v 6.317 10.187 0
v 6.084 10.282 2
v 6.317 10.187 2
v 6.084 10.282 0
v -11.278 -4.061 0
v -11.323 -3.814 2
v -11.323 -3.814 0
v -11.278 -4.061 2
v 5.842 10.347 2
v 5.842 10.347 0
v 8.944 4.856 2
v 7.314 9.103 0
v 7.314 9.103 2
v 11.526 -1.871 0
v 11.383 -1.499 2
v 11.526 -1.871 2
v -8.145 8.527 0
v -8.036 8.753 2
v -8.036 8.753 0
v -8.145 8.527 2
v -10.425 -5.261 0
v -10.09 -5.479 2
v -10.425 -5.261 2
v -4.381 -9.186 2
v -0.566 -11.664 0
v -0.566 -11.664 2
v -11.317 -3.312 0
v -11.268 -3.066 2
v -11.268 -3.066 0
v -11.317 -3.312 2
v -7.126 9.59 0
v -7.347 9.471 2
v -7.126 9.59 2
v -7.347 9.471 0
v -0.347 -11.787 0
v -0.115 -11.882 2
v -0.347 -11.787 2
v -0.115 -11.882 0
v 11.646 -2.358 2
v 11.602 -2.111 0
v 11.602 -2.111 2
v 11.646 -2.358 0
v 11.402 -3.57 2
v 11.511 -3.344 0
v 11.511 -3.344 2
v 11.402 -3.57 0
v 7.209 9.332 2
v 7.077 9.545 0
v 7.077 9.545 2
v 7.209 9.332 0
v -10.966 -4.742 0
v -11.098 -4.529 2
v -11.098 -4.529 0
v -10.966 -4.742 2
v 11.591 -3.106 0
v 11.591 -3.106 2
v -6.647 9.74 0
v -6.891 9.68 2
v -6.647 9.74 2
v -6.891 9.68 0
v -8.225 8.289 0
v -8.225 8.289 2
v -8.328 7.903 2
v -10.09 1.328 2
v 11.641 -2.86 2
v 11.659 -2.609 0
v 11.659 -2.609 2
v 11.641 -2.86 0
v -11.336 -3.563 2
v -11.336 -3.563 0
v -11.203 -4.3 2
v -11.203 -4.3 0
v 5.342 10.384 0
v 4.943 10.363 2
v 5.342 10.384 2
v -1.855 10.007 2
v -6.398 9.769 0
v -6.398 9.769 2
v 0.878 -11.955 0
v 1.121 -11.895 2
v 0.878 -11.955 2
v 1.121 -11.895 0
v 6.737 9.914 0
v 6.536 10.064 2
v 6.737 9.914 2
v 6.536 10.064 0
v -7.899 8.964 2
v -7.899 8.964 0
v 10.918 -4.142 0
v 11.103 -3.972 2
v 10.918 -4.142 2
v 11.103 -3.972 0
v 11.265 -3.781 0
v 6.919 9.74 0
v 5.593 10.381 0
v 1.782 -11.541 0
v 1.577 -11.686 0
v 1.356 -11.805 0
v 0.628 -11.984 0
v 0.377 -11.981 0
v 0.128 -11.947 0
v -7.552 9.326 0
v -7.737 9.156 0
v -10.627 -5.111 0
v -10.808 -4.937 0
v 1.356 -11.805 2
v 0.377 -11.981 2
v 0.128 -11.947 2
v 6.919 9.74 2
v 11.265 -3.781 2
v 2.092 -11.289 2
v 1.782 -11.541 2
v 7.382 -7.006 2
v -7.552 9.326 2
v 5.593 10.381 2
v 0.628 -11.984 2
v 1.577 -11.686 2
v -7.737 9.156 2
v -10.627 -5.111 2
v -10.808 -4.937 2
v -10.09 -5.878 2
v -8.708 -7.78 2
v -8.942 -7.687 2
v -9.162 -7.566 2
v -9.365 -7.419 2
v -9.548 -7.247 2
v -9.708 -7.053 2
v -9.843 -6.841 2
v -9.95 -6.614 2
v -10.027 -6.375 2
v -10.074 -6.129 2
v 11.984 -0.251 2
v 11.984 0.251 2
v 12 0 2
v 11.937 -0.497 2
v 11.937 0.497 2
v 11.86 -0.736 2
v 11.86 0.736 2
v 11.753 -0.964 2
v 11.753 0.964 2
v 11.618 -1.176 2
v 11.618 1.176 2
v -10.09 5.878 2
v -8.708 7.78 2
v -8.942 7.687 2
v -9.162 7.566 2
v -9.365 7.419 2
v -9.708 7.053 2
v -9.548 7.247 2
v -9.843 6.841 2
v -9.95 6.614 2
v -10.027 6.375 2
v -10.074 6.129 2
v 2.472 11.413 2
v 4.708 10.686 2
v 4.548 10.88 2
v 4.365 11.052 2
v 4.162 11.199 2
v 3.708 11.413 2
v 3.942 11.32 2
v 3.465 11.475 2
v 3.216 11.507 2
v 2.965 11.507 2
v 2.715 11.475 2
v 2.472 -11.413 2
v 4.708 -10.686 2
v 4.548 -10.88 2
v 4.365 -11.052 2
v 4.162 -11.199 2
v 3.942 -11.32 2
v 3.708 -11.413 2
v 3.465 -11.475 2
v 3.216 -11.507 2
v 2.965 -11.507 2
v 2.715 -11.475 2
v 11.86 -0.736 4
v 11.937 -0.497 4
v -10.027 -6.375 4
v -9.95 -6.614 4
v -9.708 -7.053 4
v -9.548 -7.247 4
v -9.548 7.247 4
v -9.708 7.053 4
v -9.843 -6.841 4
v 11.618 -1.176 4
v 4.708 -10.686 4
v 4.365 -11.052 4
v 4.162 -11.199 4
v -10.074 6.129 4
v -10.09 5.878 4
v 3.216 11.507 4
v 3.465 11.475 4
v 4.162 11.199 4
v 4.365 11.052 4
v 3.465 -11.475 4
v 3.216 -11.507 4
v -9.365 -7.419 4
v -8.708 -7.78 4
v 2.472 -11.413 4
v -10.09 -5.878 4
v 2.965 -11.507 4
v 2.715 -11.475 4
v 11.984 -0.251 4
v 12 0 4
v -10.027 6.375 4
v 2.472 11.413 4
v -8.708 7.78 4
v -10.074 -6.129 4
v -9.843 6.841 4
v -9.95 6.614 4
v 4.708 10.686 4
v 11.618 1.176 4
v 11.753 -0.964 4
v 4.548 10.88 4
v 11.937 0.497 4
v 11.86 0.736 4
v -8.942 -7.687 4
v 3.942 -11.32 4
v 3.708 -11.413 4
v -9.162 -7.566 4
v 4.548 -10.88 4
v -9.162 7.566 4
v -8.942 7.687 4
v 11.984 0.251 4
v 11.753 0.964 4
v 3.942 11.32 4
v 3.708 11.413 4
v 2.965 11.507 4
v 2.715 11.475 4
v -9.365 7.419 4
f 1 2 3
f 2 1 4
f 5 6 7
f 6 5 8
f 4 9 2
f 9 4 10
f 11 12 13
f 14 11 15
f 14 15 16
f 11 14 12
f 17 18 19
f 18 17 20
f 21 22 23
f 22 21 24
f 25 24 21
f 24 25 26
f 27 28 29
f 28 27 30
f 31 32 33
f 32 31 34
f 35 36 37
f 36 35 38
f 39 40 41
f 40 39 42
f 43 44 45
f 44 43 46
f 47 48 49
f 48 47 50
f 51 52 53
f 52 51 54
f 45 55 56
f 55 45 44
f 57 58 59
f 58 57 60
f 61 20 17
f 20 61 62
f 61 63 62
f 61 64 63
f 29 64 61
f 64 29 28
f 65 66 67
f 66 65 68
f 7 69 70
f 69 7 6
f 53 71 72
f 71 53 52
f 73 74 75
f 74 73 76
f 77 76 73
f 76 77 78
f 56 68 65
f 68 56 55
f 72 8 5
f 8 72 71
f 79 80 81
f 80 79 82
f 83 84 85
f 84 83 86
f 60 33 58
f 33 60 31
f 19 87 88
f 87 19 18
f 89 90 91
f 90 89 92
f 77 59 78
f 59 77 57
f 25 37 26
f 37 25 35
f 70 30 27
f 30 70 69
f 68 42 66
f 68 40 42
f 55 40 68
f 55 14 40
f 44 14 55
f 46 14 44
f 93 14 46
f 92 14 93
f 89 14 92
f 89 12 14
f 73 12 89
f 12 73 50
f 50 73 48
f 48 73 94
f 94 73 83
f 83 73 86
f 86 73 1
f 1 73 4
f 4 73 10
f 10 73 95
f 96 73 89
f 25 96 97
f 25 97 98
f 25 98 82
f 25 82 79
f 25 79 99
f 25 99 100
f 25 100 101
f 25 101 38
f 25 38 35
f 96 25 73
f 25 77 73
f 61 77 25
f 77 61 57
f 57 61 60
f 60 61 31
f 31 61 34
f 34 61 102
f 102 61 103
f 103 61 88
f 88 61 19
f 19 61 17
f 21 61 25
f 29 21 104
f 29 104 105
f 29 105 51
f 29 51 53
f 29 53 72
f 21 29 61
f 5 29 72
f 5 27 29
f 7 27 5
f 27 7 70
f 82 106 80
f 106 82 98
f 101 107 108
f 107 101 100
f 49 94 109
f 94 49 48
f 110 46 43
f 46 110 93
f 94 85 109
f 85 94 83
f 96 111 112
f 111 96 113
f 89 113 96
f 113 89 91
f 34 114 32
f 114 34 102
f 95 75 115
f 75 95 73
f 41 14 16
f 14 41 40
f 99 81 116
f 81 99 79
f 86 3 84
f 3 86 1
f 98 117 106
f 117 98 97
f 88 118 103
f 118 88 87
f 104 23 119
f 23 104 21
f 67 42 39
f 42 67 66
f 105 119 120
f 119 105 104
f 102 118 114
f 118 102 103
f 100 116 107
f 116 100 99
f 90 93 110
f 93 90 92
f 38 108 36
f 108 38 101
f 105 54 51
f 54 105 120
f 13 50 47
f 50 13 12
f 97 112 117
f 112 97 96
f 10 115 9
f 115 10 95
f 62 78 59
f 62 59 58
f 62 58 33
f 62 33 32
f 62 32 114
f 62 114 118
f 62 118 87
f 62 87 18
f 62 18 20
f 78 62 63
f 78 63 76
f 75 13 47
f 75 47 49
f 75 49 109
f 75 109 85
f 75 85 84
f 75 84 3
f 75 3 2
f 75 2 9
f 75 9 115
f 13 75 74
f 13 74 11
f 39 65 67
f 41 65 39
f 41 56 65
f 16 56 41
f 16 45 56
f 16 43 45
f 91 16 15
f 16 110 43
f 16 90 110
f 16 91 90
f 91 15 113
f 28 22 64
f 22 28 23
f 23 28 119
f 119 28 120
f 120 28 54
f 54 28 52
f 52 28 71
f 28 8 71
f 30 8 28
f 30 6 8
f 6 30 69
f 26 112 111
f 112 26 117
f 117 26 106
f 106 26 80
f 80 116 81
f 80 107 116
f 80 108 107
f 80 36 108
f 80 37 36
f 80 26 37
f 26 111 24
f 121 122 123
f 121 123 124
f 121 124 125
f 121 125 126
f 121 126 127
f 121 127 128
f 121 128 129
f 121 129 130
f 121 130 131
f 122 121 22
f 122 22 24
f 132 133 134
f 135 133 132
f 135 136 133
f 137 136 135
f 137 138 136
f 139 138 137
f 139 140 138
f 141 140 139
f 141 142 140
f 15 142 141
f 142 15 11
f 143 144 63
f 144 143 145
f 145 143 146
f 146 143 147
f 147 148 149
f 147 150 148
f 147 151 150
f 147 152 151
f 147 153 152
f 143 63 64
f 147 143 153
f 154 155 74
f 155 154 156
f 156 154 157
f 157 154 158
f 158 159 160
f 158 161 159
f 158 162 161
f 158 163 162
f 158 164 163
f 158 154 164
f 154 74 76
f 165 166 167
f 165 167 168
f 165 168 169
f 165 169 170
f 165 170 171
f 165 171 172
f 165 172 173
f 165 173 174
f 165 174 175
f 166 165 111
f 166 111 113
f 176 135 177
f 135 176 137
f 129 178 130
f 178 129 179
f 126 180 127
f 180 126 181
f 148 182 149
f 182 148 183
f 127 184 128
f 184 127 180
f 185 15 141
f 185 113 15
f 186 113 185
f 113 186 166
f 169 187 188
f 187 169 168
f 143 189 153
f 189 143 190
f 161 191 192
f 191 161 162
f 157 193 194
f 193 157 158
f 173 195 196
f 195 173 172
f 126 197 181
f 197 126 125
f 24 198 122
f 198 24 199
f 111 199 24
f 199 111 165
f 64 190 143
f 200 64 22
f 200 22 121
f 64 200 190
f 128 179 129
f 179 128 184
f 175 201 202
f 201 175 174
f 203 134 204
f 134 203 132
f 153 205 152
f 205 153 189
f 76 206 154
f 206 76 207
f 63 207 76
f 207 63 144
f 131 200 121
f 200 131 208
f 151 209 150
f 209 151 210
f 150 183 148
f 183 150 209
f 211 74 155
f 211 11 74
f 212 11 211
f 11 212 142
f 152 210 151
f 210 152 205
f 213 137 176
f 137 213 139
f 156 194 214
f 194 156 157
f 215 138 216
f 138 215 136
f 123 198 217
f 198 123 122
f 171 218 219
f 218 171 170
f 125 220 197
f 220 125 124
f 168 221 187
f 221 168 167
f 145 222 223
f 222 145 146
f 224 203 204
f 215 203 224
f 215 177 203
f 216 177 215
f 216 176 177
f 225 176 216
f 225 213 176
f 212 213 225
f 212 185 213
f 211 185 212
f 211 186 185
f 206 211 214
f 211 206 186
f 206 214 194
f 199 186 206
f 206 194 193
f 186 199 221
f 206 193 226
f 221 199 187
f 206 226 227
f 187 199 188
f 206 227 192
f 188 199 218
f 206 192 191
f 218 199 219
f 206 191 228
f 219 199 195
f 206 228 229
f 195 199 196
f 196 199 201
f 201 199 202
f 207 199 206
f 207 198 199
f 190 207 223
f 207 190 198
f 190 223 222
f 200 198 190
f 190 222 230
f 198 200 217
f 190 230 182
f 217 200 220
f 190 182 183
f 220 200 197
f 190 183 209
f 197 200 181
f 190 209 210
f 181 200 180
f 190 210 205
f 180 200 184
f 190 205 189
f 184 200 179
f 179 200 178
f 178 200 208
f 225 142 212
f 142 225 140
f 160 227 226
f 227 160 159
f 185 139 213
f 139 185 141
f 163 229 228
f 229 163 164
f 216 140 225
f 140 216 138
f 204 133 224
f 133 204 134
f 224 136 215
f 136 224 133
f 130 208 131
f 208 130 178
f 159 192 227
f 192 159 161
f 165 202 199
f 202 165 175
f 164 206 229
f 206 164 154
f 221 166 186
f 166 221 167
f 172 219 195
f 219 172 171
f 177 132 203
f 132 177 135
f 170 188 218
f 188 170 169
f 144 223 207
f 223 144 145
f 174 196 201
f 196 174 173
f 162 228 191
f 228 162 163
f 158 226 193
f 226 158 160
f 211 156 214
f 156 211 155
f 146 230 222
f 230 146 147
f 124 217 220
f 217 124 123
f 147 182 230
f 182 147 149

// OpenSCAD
module regular_polygon(sides, radius)
{
  function dia(r) = sqrt(pow(r*2,2)/2);  //sqrt((r*2^2)/2) if only we had an exponention op
  if(sides<2) square([radius,0]);
  if(sides==3) triangle(radius);
  if(sides==4) square([dia(radius),dia(radius)],center=true);
  if(sides>4) {
    angles=[ for (i = [0:sides-1]) i*(360/sides) ];
    coords=[ for (th=angles) [radius*cos(th), radius*sin(th)] ];
    polygon(coords);
  }
}

module pentagon(radius)
{
  regular_polygon(5,radius);
}

module logo_pentagon(radius)
{
minkowski() {
linear_extrude(1)
pentagon(10);
cylinder(r=2,h=1);
}
}

$fn=50;
color("#55aac7") rotate(-15) logo_pentagon(5);
color("#007eb0") translate([0,0,2]) logo_pentagon(5);
